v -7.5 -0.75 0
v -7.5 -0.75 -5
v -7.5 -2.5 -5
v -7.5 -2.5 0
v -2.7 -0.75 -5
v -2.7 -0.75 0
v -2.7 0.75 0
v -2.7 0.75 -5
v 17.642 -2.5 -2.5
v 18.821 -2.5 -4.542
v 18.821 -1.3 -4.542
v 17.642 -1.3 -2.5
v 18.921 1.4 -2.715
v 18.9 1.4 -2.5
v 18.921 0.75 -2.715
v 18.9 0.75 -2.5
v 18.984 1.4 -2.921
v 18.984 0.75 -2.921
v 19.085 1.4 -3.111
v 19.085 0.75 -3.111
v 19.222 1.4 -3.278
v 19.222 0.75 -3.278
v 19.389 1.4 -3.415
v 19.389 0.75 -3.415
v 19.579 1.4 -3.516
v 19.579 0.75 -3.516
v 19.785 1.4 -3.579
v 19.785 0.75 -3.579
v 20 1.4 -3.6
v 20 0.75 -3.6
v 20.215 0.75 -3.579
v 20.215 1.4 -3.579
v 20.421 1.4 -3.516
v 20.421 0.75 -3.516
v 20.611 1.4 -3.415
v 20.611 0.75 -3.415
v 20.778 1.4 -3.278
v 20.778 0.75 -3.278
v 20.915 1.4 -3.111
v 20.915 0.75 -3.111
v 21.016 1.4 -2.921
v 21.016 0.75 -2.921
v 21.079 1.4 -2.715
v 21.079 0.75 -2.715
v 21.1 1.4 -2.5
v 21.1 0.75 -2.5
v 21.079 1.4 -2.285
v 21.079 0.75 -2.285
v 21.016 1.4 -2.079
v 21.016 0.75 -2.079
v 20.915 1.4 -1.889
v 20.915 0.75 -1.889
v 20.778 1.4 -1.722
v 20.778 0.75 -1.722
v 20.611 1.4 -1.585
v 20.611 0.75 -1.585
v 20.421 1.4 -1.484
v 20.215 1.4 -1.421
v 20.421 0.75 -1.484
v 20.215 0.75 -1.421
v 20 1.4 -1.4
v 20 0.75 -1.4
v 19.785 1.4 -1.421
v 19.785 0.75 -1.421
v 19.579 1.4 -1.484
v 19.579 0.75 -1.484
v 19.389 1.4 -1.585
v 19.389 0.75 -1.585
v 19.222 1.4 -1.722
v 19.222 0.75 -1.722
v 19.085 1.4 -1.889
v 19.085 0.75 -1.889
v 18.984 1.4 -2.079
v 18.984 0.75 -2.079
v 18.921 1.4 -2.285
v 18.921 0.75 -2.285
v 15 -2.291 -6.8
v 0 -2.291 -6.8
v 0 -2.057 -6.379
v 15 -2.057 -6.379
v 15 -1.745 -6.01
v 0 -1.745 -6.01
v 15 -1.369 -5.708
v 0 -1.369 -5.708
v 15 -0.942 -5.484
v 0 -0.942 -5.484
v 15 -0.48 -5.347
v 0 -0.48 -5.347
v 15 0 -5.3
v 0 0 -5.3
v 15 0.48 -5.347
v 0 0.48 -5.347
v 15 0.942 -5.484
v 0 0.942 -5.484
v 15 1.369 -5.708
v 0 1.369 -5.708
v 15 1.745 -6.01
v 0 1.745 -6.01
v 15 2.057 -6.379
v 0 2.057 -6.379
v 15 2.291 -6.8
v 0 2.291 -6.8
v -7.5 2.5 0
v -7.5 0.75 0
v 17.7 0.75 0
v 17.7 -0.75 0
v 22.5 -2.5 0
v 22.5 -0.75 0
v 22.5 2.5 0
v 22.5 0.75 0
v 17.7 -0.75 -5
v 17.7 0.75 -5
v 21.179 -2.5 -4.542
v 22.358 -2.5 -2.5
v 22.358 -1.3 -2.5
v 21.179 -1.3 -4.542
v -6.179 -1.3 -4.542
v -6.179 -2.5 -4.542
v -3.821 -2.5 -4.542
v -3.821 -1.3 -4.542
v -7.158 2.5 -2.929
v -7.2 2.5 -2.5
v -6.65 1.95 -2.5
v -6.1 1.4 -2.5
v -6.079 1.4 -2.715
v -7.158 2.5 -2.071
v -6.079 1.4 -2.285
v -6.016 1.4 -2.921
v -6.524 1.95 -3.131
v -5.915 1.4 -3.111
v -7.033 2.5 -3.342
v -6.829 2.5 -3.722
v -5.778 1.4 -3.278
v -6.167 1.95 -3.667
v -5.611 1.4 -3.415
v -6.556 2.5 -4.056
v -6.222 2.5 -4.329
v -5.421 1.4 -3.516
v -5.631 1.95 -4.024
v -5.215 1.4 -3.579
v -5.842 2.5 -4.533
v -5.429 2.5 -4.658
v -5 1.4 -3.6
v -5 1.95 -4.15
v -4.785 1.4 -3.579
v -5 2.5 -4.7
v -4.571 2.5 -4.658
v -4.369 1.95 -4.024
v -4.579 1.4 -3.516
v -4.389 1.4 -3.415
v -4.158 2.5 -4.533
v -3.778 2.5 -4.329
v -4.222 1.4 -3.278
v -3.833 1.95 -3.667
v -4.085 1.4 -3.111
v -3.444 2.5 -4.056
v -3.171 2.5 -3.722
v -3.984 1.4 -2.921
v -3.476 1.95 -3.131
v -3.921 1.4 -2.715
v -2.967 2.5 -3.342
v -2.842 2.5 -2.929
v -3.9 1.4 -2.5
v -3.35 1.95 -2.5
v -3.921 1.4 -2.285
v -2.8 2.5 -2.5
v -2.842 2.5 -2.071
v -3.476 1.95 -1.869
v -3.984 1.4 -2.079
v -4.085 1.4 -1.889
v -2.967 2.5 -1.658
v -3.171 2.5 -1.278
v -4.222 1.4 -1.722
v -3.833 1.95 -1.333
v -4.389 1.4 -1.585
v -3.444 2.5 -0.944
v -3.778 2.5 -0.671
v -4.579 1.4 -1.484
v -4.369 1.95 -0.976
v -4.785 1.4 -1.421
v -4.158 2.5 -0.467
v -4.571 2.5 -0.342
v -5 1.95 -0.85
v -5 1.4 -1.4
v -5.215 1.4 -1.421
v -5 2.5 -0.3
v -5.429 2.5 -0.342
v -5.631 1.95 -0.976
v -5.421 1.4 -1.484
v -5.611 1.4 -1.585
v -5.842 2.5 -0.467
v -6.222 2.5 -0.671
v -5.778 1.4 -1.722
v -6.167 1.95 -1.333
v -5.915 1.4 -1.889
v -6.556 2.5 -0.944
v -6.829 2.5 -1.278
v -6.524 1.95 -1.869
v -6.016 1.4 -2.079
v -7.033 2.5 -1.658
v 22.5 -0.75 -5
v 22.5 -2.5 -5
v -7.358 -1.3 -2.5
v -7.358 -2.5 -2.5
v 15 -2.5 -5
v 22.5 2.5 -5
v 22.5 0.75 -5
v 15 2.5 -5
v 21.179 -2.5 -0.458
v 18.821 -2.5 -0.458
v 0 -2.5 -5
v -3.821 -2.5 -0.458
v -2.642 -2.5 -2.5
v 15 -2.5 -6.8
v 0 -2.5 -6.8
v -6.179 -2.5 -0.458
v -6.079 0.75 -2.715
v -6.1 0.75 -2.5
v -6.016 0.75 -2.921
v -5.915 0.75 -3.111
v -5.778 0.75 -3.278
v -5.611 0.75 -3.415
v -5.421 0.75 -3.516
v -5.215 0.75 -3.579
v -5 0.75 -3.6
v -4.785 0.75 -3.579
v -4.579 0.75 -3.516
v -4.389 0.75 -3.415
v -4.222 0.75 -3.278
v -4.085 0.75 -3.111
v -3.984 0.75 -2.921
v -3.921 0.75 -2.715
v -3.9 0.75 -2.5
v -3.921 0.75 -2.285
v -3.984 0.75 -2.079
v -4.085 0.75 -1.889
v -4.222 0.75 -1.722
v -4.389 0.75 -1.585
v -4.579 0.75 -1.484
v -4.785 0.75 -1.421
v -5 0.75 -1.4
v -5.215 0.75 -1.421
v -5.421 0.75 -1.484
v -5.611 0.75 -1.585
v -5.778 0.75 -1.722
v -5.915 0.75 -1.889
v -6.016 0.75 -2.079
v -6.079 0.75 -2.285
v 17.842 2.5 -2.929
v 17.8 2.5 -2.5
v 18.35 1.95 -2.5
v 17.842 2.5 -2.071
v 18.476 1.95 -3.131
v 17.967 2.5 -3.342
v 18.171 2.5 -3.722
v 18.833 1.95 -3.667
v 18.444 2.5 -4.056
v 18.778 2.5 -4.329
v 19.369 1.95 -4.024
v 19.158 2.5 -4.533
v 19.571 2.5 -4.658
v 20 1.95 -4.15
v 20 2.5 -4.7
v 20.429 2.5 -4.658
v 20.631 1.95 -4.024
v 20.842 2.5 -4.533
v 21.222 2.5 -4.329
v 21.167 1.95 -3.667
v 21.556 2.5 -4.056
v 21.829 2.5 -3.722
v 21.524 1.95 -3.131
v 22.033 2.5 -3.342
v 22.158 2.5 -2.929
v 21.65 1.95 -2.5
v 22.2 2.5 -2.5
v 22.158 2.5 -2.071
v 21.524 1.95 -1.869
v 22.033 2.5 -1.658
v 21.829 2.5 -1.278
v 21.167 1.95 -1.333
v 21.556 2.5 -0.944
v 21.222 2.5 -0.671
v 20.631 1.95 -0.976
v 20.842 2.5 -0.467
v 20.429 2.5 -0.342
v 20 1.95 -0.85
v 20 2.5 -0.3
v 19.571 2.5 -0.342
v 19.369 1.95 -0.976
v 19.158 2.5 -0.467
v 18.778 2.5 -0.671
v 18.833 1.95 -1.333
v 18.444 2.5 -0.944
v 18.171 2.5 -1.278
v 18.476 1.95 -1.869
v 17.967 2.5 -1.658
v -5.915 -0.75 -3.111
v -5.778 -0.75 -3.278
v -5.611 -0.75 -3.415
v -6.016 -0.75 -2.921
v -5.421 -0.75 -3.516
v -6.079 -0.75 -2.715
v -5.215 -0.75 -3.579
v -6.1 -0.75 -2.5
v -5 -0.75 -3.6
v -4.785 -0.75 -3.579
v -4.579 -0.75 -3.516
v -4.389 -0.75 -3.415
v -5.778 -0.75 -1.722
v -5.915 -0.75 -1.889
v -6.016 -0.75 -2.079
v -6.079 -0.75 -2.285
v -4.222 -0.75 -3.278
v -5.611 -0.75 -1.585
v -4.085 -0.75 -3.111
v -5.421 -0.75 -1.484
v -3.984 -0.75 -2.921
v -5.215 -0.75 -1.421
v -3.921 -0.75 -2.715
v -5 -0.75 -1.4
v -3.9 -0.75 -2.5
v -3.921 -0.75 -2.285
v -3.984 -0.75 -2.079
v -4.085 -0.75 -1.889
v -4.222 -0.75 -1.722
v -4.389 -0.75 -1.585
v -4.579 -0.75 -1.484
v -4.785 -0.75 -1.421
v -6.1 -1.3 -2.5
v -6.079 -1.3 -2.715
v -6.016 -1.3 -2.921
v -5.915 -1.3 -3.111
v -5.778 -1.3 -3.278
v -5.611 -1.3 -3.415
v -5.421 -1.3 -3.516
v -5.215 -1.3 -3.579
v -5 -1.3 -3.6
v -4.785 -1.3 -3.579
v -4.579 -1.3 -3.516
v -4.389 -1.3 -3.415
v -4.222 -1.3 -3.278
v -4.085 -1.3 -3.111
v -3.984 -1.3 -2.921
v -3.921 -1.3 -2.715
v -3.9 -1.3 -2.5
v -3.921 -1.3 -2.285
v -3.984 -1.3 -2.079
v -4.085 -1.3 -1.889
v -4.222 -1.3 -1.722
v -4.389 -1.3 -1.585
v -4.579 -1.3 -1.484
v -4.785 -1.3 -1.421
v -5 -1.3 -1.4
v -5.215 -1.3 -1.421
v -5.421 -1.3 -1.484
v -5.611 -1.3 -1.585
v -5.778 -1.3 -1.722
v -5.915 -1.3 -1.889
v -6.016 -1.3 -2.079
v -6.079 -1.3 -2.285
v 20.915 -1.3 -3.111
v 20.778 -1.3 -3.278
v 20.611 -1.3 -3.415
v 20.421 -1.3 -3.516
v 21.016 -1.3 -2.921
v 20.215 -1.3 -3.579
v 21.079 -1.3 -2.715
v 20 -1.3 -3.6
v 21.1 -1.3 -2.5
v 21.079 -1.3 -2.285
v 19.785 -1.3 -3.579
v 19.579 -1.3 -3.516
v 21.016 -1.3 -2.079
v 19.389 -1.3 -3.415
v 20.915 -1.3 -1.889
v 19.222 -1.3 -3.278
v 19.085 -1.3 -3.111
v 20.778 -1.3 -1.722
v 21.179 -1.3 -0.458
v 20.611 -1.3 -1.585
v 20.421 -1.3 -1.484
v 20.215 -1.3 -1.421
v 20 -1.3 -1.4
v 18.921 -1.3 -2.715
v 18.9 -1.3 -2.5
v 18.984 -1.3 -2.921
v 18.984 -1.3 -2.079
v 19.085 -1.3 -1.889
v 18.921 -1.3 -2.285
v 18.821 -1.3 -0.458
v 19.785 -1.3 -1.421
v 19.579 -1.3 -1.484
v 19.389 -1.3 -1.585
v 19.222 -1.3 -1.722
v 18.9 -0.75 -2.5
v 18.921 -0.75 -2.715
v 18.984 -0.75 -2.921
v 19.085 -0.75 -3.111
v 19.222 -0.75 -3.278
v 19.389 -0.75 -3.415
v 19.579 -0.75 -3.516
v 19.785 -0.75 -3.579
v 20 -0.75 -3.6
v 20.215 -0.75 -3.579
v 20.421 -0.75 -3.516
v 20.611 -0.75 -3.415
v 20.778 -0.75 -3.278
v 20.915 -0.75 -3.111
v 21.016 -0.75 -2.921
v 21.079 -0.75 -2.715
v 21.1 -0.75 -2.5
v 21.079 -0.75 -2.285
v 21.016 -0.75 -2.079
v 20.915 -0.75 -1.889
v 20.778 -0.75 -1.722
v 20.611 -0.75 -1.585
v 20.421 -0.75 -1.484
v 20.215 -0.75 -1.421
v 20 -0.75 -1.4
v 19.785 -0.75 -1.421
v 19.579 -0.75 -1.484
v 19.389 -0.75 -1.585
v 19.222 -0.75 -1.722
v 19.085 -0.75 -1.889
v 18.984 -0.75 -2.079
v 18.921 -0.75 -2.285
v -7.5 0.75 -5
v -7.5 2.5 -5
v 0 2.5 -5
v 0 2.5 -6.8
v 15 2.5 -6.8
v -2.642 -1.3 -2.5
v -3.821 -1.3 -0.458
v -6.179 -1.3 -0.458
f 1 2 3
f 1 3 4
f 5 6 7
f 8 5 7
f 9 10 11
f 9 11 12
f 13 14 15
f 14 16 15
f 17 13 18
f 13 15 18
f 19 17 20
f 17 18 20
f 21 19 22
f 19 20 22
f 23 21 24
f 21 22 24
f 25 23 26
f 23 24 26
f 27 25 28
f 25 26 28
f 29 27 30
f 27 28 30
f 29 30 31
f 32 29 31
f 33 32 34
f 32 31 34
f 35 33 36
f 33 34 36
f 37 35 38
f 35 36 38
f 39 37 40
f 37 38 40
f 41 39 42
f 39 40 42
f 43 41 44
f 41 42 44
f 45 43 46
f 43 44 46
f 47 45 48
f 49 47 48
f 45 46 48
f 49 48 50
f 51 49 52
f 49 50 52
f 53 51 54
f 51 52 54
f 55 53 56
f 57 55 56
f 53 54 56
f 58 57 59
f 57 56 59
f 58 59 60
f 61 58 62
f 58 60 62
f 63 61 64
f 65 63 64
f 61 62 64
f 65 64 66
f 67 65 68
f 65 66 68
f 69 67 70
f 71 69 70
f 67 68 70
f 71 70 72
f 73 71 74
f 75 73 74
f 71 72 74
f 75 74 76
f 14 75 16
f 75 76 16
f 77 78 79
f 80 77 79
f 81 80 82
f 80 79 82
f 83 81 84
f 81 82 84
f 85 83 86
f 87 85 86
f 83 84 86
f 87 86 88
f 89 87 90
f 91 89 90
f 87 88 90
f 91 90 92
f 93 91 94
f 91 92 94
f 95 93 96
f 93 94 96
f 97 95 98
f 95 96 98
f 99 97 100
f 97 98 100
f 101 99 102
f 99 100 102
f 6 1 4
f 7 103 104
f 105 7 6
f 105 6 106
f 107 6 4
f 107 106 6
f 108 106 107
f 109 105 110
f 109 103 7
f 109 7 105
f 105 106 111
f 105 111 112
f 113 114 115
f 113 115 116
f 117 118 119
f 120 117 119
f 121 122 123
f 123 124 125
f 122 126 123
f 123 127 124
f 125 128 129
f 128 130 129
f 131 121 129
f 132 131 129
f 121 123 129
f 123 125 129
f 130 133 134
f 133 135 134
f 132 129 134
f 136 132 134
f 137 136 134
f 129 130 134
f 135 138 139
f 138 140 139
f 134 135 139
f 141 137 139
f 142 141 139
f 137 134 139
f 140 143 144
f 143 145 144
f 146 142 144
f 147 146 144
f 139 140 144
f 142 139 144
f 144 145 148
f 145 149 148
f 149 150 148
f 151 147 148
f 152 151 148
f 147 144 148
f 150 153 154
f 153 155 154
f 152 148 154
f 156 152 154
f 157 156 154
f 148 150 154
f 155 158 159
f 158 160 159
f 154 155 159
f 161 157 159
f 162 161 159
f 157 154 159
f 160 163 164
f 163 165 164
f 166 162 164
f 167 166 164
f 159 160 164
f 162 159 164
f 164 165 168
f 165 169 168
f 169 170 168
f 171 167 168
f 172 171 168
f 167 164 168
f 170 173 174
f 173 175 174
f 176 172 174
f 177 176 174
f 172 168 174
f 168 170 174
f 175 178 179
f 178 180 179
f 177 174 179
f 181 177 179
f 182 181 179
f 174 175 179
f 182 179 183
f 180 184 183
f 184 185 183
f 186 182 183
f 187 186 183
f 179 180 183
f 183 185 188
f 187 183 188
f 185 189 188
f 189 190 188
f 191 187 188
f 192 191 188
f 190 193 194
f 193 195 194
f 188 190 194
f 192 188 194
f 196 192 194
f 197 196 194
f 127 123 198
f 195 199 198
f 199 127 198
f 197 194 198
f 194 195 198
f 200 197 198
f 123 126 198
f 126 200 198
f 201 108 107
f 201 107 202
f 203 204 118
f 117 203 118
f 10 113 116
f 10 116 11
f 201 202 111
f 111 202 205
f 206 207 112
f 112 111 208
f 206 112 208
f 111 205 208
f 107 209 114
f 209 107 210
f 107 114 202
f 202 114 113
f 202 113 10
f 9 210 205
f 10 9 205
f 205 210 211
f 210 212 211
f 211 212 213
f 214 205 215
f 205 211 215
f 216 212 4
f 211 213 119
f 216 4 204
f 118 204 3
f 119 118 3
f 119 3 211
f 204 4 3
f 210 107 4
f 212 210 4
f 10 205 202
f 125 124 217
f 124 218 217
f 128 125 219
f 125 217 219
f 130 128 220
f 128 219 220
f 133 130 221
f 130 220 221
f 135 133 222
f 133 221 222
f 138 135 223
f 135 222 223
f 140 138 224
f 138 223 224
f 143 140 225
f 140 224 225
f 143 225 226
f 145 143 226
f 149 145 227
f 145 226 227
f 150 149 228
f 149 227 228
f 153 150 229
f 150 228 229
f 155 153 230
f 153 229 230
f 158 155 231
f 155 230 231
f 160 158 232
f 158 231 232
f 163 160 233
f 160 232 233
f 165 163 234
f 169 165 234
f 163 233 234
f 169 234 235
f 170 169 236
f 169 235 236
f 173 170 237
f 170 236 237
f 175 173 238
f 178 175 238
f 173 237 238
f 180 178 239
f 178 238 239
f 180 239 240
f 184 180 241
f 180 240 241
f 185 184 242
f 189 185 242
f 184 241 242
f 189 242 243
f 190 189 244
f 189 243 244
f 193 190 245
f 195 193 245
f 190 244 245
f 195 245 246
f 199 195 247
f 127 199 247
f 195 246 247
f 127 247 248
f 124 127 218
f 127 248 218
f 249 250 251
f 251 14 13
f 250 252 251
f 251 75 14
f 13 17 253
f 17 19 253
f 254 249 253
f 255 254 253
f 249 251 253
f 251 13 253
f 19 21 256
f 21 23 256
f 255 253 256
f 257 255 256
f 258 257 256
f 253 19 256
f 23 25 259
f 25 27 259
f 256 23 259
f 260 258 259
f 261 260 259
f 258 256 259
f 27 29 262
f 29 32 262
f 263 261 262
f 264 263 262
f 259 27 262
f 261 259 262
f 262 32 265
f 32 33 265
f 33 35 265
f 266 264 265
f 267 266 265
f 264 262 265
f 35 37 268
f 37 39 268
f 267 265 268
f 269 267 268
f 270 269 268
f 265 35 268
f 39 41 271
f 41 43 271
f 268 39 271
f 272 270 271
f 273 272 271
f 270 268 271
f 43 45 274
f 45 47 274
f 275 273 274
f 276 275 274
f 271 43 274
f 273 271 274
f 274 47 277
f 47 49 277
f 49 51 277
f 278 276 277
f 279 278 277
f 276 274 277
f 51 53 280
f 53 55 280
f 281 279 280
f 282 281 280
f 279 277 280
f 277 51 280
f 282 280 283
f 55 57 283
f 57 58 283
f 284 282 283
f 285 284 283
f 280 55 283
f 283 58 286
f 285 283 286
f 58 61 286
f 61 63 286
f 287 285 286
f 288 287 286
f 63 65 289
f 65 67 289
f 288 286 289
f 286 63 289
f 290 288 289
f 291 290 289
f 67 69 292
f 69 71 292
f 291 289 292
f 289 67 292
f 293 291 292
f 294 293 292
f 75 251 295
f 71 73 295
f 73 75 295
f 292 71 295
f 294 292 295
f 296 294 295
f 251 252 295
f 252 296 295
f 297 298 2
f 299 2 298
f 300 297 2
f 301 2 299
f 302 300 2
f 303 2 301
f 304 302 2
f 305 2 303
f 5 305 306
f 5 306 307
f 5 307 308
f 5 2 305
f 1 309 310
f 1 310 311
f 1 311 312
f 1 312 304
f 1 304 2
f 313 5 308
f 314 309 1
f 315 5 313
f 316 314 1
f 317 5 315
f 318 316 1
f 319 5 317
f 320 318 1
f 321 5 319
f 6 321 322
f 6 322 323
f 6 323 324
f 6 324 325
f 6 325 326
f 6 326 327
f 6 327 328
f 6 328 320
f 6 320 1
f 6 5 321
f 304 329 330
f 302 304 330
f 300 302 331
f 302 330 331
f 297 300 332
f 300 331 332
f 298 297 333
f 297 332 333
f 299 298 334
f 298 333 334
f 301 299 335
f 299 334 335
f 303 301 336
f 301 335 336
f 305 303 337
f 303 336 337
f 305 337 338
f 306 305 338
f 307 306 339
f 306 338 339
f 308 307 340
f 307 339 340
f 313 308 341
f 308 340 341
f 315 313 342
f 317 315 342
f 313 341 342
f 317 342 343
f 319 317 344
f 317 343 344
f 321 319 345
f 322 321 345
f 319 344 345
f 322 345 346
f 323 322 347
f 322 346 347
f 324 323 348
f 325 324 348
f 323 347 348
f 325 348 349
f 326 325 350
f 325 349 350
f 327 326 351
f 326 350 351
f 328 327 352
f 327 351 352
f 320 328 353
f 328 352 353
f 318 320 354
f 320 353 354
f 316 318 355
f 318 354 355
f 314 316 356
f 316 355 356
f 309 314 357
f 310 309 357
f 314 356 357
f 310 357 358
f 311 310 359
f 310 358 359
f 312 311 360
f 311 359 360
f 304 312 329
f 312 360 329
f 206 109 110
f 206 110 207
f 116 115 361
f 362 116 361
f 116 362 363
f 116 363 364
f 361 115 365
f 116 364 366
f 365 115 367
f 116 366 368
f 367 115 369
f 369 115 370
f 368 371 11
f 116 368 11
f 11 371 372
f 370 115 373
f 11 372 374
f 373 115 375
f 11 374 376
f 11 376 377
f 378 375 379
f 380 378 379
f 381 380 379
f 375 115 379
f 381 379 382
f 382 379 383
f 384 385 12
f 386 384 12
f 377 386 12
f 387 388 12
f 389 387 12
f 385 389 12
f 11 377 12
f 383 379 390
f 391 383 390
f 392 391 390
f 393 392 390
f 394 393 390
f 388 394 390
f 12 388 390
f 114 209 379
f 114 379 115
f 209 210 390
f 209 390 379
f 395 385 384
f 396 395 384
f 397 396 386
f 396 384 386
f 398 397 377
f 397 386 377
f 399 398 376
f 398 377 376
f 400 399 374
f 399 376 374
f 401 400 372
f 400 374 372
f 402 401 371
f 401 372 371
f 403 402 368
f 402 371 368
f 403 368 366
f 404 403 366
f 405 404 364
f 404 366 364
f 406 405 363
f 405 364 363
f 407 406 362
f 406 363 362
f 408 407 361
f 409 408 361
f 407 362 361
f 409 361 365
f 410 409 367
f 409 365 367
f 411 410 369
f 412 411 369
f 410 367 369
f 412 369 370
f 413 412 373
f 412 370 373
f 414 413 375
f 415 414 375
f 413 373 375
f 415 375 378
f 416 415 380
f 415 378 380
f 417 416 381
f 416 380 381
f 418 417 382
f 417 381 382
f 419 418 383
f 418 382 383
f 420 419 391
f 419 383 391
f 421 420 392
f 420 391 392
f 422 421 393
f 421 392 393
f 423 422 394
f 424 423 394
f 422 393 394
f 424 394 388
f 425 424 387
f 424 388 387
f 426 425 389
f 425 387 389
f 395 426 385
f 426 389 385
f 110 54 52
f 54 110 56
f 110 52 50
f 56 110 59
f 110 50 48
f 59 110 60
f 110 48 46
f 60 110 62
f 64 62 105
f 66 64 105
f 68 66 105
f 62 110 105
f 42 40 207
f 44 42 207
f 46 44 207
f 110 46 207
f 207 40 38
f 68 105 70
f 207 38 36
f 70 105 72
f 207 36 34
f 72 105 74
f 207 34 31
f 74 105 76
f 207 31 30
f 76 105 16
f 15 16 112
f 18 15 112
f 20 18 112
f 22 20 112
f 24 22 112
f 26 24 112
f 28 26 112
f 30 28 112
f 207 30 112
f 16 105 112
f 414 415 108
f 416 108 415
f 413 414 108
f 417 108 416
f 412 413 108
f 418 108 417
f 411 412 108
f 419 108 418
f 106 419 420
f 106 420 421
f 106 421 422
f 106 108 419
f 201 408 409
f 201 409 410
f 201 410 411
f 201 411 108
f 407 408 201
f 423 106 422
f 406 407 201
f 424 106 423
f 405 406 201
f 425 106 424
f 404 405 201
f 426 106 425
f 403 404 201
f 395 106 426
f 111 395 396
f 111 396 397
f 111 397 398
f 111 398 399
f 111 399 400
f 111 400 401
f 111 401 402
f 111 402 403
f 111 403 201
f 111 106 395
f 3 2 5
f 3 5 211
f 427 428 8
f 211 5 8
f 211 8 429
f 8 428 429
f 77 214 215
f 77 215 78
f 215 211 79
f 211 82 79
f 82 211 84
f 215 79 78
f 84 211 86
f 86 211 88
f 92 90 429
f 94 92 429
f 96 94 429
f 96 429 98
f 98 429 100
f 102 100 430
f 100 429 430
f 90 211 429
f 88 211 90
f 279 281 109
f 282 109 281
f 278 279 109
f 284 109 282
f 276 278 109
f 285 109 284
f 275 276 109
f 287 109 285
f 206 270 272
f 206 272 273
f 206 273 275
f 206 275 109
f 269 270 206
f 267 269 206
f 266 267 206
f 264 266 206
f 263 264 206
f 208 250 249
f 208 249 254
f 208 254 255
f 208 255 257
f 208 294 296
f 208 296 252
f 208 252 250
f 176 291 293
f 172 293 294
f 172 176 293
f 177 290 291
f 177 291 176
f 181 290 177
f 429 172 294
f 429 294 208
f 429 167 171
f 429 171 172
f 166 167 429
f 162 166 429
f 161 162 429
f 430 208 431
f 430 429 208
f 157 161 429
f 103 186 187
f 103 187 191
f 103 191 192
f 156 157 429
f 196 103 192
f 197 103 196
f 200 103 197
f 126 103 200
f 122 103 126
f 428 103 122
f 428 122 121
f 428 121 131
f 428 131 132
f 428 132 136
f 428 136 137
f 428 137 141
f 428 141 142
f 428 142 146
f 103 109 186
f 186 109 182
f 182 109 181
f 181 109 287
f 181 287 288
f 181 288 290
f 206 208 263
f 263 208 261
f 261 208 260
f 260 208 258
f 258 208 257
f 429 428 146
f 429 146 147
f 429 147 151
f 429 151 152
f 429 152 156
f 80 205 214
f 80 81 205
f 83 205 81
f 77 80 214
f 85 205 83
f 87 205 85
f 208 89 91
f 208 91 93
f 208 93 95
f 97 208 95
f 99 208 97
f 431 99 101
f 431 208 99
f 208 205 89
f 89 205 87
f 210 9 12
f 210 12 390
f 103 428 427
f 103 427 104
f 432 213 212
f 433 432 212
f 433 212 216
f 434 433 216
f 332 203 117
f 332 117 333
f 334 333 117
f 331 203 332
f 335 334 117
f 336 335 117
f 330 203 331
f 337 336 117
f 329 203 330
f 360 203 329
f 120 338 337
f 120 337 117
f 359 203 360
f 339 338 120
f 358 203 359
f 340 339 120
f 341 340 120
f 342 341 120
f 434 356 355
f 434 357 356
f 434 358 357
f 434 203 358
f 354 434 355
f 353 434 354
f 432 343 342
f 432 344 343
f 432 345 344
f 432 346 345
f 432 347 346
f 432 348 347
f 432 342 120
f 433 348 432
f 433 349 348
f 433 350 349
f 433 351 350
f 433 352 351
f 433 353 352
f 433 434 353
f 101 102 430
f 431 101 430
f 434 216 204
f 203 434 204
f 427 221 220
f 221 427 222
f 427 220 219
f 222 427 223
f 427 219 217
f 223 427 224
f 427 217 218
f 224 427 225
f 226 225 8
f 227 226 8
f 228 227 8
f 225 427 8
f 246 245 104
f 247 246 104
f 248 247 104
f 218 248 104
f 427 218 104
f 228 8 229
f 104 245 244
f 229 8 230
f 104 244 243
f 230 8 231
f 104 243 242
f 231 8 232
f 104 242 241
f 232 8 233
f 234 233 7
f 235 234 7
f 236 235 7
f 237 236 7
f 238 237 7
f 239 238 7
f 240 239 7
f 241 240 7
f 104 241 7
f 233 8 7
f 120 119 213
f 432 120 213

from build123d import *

# Parameters (mm, degrees)
EXTRUDE_1_DEPTH             = 15
SKETCH_2_W                  = 1
SKETCH_2_H                  = 1
CUT_EXTRUDE_1_DEPTH         = 15
SKETCH_6_W                  = 5
SKETCH_6_H                  = 1.75
EXTRUDE_2_DEPTH             = 7.5
SKETCH_7_W                  = 5
SKETCH_7_H                  = 1.75
EXTRUDE_3_DEPTH             = 7.5
HOLE_WIZARD_M21_D           = 2.2
HOLE_WIZARD_M21_CSINK_D     = 4.4
HOLE_WIZARD_M21_CSINK_ANGLE = 90
CUT_EXTRUDE_2_DEPTH         = 1.2
SKETCH_8_W                  = 2.7
SKETCH_8_H                  = 1.5
EXTRUDE_4_DEPTH             = 5


with BuildPart() as part:
    # Эскиз1 → Бобышка-Вытянуть1 (new body)
    with BuildSketch(Plane(origin=(0, 0, 0), x_dir=(0, 0, -1), z_dir=(1, 0, 0))):
        with BuildLine():
            Line((0, 2.5), (0, -2.5))
            Line((0, -2.5), (7.8, -2.5))
            ThreePointArc((7.8, -2.5), (5.3, 0), (7.8, 2.5))
            Line((7.8, 2.5), (0, 2.5))
        make_face()
    extrude(amount=EXTRUDE_1_DEPTH)

    # Эскиз2 → Вырез-Вытянуть1 (cut)
    with BuildSketch(Plane(origin=(15, 0, 0), x_dir=(0, 0, -1), z_dir=(1, 0, 0))):
        with Locations((7.3, 2)):
            Rectangle(SKETCH_2_W, SKETCH_2_H)
        with Locations((7.3, -2)):
            Rectangle(SKETCH_2_W, SKETCH_2_H)
    extrude(amount=-CUT_EXTRUDE_1_DEPTH, mode=Mode.SUBTRACT)

    # Эскиз6 → Бобышка-Вытянуть2 (add)
    with BuildSketch(Plane.ZY):
        with Locations((-2.5, 1.625)):
            Rectangle(SKETCH_6_W, SKETCH_6_H)
        with Locations((-2.5, -1.625)):
            Rectangle(SKETCH_6_W, SKETCH_6_H)
    extrude(amount=EXTRUDE_2_DEPTH)

    # Эскиз7 → Бобышка-Вытянуть3 (add)
    with BuildSketch(Plane(origin=(15, 0, 0), x_dir=(0, 0, -1), z_dir=(1, 0, 0))):
        with Locations((2.5, 1.625)):
            Rectangle(SKETCH_7_W, SKETCH_7_H)
        with Locations((2.5, -1.625)):
            Rectangle(SKETCH_7_W, SKETCH_7_H)
    extrude(amount=EXTRUDE_3_DEPTH)

    # Зенковка для винта с полупотайной головкой M21 (through all)
    with Locations(Plane(origin=(0, 2.5, 0), x_dir=(1, 0, 0), z_dir=(0, 1, 0))):
        with Locations((20, 2.5), (-5, 2.5)):
            CounterSinkHole(HOLE_WIZARD_M21_D / 2, HOLE_WIZARD_M21_CSINK_D / 2, counter_sink_angle=HOLE_WIZARD_M21_CSINK_ANGLE)

    # Эскиз5 → Вырез-Вытянуть2 (cut)
    with BuildSketch(Plane.XZ.offset(2.5)):
        Polygon((-6.178867871, -0.458141777), (-7.357735027, -2.500000412), (-6.178867157, -4.541858635), (-3.821132129, -4.541858223), (-2.642264973, -2.499999588), (-3.821132843, -0.458141365), align=None)
        Polygon((21.178867119, -4.541858635), (18.821132092, -4.541858223), (17.642264935, -2.499999588), (18.821132806, -0.458141365), (21.178867833, -0.458141777), (22.357734989, -2.500000412), align=None)
    extrude(amount=-CUT_EXTRUDE_2_DEPTH, mode=Mode.SUBTRACT)

    # Эскиз8 → Бобышка-Вытянуть4 (add)
    with BuildSketch(Plane.XY):
        with Locations((-1.35, 0)):
            Rectangle(SKETCH_8_W, SKETCH_8_H)
        with Locations((16.35, 0)):
            Rectangle(SKETCH_8_W, SKETCH_8_H)
    extrude(amount=-EXTRUDE_4_DEPTH)


solid = part.part
